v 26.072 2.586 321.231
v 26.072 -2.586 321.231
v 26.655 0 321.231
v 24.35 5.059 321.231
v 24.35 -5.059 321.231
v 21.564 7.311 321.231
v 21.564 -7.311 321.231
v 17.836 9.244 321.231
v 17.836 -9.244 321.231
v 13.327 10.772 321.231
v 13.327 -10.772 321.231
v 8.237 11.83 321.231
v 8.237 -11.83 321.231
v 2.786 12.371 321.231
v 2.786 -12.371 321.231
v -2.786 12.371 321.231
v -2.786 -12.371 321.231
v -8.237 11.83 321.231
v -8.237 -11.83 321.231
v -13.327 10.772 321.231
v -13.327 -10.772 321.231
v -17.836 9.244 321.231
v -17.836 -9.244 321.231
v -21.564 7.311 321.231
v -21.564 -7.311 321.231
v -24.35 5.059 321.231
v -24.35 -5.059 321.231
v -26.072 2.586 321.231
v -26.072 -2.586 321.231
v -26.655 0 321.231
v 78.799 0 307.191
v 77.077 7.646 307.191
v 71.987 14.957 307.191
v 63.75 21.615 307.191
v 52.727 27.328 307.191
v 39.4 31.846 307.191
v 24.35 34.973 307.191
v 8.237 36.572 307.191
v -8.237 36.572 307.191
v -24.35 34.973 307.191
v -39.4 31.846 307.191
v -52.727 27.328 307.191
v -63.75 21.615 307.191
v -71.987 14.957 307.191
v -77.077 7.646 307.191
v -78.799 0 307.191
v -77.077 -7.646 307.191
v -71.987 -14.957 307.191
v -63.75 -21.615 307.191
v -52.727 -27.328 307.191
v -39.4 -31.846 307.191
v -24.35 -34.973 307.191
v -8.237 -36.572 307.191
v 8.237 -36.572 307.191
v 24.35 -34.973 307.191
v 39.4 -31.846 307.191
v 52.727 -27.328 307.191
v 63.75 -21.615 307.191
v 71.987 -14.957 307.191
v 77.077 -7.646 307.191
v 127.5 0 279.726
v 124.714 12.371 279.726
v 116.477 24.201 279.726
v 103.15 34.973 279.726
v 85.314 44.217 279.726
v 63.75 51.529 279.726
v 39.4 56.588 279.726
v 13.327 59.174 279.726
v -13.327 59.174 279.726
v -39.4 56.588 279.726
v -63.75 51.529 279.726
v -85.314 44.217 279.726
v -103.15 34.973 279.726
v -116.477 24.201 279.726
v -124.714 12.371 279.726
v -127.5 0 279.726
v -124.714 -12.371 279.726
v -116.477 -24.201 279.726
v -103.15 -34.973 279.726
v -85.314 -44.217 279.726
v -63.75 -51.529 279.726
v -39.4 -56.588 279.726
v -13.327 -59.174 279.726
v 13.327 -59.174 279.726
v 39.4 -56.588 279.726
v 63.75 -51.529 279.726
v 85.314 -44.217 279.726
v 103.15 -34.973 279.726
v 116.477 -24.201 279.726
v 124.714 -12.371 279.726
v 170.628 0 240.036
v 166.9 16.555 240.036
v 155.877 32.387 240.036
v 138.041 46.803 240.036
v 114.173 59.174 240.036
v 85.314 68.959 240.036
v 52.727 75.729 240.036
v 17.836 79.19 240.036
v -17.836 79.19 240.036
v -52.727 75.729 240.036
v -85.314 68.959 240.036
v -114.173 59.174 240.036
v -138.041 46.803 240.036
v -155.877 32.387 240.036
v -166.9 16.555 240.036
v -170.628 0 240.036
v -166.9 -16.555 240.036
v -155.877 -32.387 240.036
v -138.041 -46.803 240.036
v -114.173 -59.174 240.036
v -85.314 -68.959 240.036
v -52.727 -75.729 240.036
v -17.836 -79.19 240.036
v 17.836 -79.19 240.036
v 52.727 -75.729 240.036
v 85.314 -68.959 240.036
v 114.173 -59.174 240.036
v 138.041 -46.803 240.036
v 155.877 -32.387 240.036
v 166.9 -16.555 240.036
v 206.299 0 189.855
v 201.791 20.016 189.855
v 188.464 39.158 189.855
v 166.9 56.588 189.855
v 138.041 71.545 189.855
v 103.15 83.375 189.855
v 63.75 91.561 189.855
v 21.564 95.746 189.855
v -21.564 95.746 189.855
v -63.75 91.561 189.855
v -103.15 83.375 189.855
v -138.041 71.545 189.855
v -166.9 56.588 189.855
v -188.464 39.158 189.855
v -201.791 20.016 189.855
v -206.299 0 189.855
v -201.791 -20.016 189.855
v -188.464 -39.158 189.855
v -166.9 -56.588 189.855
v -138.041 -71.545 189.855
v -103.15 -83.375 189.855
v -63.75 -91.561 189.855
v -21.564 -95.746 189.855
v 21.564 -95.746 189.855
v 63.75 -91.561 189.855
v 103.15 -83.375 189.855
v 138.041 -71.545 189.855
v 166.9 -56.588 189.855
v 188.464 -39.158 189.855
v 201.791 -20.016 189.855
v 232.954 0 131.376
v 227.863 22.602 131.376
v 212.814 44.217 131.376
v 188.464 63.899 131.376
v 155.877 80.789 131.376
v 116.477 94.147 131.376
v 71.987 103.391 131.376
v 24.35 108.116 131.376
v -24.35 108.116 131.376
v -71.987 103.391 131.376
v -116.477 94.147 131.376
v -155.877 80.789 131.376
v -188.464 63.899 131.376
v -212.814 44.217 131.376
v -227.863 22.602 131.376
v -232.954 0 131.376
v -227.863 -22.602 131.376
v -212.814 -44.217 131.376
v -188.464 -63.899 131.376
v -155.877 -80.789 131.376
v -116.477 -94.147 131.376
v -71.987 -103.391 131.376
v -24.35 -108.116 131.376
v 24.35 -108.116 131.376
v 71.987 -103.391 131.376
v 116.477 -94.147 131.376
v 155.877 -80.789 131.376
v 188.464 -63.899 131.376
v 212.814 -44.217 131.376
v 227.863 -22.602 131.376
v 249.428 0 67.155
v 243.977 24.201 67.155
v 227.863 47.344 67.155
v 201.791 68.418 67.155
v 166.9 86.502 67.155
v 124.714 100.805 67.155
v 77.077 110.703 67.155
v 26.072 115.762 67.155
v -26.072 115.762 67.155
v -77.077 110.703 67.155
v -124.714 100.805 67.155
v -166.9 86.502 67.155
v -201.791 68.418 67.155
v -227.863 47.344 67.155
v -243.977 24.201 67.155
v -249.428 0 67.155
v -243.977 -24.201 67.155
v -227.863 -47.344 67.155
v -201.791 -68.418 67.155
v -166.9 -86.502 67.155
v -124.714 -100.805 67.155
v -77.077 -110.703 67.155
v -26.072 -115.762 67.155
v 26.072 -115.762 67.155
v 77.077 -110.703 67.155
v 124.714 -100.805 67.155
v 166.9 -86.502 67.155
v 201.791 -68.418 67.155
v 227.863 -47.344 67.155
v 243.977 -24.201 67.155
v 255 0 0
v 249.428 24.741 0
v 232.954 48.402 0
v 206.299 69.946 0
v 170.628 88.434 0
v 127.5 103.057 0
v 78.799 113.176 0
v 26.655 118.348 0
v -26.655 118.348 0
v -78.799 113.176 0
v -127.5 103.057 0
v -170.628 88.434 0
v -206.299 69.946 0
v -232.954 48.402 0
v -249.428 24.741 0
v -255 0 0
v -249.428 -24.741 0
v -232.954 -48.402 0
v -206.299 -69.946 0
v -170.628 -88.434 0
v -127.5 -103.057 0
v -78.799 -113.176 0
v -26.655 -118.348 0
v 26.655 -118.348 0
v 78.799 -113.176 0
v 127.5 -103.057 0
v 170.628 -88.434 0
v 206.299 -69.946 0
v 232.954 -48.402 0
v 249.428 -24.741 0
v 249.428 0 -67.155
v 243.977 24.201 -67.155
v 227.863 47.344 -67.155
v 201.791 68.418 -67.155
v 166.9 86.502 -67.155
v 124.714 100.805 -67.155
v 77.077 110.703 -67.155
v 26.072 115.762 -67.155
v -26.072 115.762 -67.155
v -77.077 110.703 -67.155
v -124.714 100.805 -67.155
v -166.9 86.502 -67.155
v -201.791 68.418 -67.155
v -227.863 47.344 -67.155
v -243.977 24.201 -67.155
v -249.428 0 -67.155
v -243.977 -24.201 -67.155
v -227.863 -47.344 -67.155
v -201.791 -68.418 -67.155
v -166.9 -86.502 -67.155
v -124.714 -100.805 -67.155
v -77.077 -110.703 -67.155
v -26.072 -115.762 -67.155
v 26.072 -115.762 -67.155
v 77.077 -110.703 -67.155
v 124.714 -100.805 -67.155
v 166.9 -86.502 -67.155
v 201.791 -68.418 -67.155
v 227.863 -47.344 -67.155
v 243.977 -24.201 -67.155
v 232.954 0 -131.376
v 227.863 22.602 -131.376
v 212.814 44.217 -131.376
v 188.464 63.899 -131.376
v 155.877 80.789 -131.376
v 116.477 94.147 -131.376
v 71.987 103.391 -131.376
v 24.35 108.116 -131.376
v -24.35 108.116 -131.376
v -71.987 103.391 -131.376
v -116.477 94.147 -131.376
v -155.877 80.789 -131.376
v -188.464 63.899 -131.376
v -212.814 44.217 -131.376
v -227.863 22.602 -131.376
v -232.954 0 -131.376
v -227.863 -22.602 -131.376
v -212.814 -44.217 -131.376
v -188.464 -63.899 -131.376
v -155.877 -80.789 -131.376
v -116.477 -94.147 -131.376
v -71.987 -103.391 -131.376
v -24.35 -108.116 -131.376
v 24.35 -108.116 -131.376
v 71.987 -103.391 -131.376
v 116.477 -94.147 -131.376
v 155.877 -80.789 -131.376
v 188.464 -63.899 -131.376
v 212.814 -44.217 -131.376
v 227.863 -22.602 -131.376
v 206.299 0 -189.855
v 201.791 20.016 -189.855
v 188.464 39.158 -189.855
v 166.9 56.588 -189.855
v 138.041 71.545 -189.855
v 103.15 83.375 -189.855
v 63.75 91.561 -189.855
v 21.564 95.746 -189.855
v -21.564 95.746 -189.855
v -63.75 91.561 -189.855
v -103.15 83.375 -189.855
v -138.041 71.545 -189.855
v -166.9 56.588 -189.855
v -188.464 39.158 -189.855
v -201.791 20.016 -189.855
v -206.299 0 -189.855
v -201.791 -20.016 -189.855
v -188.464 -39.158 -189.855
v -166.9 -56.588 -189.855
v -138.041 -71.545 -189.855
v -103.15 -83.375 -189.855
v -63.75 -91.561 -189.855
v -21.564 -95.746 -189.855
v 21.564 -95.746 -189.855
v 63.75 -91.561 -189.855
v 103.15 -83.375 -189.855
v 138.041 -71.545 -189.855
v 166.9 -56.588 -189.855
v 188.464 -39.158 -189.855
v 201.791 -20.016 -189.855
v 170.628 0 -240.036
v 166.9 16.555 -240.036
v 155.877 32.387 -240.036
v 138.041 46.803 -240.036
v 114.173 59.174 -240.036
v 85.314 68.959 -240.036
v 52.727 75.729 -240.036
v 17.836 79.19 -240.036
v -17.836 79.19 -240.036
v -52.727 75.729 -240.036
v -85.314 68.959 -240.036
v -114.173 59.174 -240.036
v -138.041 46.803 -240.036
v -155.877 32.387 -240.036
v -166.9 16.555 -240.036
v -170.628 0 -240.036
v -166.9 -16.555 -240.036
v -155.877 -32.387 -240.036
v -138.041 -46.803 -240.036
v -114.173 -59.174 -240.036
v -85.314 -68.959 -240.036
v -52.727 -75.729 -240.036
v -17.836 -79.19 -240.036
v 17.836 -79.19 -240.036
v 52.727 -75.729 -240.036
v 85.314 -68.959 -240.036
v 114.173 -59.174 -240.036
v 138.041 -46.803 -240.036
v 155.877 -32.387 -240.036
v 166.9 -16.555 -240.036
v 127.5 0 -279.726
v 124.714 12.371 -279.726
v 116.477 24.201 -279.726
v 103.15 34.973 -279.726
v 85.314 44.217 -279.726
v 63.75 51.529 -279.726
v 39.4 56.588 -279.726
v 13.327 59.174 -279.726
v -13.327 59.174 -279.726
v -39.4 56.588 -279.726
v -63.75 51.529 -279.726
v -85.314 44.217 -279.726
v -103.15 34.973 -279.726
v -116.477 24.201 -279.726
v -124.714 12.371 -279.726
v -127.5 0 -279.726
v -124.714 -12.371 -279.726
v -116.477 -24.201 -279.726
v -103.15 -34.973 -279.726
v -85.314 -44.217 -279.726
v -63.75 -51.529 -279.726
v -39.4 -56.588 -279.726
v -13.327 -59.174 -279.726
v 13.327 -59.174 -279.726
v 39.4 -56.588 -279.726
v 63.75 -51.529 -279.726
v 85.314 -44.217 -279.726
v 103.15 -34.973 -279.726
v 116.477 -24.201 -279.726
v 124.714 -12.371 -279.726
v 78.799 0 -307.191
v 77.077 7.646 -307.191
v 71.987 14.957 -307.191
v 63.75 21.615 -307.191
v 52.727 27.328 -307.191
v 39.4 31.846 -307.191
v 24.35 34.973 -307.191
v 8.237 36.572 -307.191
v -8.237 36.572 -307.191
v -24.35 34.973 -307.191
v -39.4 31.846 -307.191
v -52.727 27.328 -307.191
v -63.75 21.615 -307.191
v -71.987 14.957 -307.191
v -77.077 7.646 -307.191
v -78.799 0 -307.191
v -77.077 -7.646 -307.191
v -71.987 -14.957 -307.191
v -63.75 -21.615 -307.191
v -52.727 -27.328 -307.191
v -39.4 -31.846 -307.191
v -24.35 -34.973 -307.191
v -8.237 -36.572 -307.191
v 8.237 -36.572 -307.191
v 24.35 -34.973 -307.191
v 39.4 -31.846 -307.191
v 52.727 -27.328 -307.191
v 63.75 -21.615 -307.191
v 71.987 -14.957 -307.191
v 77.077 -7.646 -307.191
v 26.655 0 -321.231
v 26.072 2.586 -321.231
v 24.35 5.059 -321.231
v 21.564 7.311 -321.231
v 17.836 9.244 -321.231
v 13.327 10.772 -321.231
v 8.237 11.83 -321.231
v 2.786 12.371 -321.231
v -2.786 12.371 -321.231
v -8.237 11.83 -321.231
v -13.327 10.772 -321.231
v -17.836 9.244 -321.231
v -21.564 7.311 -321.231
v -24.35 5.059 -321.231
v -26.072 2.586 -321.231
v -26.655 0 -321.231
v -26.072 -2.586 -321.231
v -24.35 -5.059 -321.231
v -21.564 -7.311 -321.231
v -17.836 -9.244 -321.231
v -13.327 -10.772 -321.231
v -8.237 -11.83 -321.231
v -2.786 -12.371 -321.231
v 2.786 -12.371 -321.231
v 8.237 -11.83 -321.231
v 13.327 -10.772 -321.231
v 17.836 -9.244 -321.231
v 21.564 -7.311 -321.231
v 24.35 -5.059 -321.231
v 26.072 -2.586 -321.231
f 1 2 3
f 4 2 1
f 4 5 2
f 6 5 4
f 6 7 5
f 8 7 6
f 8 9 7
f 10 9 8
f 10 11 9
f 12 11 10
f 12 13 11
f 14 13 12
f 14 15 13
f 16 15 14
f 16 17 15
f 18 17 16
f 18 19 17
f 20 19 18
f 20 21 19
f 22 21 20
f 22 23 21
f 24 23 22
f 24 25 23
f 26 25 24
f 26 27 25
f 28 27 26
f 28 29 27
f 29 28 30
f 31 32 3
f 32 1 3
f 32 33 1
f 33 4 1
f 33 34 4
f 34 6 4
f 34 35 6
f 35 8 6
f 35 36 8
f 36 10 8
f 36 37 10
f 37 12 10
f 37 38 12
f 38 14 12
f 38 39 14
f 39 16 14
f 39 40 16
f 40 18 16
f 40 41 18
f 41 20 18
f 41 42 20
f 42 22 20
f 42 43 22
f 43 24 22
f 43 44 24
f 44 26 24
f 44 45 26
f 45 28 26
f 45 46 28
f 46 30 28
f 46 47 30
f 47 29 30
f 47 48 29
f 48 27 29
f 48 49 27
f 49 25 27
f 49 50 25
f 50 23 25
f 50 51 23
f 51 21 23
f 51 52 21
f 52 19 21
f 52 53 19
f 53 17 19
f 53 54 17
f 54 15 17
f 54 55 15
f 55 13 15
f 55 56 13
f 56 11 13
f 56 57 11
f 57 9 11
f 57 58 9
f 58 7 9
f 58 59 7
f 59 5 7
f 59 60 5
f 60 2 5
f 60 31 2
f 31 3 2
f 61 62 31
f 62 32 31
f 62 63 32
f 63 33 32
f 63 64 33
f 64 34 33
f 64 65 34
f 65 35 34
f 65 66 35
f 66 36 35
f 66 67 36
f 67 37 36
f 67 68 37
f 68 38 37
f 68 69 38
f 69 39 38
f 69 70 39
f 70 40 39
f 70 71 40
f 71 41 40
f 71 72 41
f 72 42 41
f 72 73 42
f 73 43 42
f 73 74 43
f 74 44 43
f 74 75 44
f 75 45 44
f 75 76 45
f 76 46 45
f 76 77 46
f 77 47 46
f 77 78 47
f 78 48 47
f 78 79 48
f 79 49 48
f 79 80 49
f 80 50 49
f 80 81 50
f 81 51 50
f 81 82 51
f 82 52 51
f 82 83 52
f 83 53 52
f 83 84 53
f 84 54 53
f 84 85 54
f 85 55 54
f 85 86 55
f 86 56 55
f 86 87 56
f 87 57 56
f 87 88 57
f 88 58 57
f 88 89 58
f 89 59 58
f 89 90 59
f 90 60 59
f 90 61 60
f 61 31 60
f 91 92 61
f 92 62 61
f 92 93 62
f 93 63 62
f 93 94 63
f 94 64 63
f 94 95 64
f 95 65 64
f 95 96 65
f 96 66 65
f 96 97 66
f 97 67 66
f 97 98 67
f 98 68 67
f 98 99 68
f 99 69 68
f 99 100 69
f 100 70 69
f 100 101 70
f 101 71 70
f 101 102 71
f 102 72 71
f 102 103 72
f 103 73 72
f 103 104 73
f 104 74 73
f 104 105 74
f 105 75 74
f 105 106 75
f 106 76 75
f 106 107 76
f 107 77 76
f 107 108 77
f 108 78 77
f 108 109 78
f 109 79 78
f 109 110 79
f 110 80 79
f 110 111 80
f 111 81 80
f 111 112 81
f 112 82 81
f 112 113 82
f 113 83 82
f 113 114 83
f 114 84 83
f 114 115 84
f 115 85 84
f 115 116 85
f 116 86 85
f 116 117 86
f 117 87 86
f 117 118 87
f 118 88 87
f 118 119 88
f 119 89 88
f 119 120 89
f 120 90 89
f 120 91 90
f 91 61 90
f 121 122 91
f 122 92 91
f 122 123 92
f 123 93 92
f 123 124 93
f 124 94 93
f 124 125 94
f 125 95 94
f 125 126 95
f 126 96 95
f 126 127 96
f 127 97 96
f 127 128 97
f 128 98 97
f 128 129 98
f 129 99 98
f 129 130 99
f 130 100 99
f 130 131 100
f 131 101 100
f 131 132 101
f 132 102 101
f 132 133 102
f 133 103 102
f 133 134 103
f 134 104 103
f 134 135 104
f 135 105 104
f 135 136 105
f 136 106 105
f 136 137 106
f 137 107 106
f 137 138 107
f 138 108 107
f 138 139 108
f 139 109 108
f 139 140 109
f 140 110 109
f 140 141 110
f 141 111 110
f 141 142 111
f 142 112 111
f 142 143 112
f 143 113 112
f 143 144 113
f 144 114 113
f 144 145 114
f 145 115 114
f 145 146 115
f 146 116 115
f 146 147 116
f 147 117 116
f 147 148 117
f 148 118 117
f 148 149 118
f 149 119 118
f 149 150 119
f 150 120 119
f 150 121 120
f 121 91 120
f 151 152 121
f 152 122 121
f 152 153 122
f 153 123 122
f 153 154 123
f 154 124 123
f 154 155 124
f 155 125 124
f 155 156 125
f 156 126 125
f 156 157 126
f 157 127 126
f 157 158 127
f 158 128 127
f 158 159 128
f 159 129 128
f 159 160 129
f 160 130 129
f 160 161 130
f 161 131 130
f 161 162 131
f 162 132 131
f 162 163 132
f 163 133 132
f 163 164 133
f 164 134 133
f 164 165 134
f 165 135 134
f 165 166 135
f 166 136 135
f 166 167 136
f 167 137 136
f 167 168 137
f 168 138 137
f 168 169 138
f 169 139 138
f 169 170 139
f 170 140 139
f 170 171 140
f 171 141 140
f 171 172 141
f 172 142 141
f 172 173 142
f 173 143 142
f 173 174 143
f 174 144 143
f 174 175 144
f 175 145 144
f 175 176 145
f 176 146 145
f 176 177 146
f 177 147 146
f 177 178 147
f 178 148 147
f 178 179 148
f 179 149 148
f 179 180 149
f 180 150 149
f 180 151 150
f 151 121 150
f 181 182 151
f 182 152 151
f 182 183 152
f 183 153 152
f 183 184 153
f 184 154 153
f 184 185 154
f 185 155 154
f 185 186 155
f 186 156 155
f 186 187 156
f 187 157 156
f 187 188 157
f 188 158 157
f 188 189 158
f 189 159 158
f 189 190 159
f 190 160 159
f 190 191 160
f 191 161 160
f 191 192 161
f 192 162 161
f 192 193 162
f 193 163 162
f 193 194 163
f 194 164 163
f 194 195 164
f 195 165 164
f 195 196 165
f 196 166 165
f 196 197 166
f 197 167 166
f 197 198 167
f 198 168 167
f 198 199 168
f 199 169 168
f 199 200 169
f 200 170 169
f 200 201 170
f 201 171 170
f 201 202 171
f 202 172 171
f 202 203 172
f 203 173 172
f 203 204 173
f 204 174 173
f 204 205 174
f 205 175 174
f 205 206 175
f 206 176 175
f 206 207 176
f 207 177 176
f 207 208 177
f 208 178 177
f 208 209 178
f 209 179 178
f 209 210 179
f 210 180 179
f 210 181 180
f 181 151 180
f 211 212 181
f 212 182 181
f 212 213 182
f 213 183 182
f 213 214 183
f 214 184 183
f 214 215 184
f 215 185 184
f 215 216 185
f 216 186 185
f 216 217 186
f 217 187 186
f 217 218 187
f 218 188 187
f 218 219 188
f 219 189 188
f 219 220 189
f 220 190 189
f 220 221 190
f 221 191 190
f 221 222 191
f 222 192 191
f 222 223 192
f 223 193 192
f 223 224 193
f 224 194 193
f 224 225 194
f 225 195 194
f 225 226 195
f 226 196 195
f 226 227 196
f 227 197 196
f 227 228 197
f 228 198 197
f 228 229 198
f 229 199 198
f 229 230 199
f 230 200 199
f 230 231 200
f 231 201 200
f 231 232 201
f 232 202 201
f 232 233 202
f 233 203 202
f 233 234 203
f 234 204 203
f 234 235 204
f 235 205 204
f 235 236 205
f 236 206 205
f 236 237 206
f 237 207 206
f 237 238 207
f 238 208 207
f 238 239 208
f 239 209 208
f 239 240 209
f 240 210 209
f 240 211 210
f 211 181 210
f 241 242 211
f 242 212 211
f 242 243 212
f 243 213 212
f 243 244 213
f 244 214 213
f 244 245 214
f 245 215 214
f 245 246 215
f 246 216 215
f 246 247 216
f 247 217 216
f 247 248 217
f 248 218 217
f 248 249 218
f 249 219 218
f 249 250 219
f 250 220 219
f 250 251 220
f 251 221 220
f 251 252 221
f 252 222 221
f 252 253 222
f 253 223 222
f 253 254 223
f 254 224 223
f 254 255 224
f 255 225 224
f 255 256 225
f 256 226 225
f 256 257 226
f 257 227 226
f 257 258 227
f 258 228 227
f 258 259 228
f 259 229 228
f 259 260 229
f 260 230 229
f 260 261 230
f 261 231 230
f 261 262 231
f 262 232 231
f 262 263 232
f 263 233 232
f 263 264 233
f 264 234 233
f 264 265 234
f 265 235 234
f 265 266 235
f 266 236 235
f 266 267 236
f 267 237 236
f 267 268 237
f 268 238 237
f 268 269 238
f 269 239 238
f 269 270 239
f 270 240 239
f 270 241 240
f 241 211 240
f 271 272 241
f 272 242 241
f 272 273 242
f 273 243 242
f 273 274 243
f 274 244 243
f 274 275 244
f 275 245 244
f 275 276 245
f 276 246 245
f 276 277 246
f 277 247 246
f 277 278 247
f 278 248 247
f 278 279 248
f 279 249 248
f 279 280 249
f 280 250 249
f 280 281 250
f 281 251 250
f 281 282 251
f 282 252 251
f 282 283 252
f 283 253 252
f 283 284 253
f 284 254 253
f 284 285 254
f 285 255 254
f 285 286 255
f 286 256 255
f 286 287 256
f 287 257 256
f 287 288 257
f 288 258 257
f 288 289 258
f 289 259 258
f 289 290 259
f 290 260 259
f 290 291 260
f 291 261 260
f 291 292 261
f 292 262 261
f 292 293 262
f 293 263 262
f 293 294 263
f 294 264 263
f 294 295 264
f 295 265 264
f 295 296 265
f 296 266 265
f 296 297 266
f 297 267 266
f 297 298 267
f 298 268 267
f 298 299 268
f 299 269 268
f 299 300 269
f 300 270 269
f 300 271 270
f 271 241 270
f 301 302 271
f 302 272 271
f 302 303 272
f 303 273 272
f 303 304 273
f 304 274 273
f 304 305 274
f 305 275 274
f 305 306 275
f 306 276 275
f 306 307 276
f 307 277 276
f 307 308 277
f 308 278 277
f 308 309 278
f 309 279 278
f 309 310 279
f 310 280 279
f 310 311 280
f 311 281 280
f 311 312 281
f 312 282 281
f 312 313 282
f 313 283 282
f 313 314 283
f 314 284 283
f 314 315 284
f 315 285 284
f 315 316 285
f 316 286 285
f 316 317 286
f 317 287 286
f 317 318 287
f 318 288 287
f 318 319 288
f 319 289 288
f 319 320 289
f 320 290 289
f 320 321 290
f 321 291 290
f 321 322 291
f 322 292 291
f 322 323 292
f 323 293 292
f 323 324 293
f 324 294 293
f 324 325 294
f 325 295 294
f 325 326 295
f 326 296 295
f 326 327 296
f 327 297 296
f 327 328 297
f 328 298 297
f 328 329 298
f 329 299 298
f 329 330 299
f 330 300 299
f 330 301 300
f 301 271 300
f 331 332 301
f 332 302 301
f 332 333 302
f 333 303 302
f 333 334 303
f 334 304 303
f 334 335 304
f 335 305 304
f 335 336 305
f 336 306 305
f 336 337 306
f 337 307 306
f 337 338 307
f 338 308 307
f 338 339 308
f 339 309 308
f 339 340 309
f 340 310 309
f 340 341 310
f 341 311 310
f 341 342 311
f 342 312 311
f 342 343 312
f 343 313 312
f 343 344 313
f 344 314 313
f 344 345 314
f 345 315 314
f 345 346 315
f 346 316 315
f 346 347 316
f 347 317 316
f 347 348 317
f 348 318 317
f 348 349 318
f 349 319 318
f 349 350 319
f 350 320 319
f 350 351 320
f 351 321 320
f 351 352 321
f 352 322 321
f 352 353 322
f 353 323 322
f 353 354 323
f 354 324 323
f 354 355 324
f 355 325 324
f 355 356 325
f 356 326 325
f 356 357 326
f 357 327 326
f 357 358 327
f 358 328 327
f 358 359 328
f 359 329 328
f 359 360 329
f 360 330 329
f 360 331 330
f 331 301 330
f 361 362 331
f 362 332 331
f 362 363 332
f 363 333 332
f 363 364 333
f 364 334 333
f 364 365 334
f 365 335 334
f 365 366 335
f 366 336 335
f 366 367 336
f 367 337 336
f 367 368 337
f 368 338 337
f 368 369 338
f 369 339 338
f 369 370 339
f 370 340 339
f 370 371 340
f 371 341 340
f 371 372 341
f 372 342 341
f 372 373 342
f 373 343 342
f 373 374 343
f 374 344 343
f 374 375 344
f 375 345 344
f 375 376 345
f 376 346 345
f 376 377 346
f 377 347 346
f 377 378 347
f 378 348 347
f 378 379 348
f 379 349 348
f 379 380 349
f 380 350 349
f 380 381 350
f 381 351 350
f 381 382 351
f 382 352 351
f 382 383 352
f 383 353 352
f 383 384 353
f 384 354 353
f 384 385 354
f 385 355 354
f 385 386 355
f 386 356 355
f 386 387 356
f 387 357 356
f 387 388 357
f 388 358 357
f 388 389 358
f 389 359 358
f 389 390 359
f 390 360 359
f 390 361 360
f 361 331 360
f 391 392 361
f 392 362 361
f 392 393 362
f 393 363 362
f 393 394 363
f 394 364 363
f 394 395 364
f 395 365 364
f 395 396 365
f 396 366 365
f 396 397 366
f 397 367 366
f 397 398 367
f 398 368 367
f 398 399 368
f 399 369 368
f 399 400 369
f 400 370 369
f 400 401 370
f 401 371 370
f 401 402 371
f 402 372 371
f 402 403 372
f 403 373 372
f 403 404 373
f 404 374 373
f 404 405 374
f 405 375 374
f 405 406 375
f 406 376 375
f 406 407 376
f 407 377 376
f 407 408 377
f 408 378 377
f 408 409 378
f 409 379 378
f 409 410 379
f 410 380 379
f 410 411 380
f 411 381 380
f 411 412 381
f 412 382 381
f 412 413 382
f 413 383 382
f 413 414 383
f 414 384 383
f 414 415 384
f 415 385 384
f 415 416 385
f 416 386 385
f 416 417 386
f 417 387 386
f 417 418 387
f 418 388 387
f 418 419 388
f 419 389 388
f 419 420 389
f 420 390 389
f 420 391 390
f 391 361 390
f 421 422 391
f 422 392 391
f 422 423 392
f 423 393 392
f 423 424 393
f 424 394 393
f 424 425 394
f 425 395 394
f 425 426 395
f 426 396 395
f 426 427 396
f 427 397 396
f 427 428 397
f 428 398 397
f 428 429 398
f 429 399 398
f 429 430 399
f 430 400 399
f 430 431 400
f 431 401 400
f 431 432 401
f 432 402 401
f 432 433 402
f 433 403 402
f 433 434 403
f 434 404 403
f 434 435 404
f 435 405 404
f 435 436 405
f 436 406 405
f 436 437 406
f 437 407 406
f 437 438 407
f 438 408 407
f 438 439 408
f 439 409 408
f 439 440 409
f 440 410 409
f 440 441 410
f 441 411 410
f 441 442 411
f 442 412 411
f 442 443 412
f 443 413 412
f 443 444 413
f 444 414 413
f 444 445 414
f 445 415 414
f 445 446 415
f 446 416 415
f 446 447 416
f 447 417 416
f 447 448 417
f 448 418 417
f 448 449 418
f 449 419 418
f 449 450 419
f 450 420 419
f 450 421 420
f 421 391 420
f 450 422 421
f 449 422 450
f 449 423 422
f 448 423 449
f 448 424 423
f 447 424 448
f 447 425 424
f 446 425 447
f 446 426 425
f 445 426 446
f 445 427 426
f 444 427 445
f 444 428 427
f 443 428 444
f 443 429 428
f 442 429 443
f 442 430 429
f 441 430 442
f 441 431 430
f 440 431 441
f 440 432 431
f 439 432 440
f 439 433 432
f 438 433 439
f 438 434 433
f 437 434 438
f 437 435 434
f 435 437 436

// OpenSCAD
// Generated by SolidPython 1.0.1 on 2020-07-29 00:46:51


scale(v = [15, 7, 19]) {
	sphere(r = 17);
}
/***********************************************
*********      SolidPython code:      **********
************************************************
 
# import packages: SolidPython
from solid import *
from solid.utils import *
from itertools import chain, combinations, permutations


class Resize:

    def __init__(self, scad_file):
        self.scad_file = scad_file
        #self.scad_file = import_scad(scad_file)
        # cone/cylinder param:
        self.r1 = 0
        self.r2 = 0
        self.h = 0
        # rectangular prism param:
        self.w = 0
        self.l = 0
        # ellipse param:
        self.r = 0

    # import OpenScad code (file name corresponds to shape)


    # classify shape + parameters
    def assign(self, param1, param2, param3):
        if self.scad_file == 'cone.scad':
            self.r1 = param1
            self.r2 = param2
            self.h = param3
        elif self.scad_file == 'cylinder.scad':
            self.r1 = param1
            self.r2 = param2
            self.h = param3
        elif self.scad_file == 'rectangularPrism.scad':
            self.h = param1
            self.l = param2
            self.w = param3
        else:
            self.r = param1
            self.h = param2

    # resize parameters
    def iterate(self):
        x = range(3, 20, 2)
        i = 1
        if self.scad_file == 'cone.scad':
            tempList = list(permutations(x, 2))
            for temp in tempList:
                param1 = temp[0]
                param2 = temp[1]
                filepath = 'produced_scad_files/' + 'cone' + str(param1) + '_' + str(param2) + '_' + '.scad'
                scad_render_to_file(cylinder(h=param1, r1=param2, r2=0), filepath)

        elif self.scad_file == 'cylinder.scad':
            tempList = list(permutations(x, 3))
            for temp in tempList:
                param1 = temp[0]
                param2 = temp[1]
                filepath = 'produced_scad_files/' + 'cylinder' + str(param1) + '_' + str(param2) + '_' + '.scad'
                scad_render_to_file(cylinder(h=param1, r1=param2, r2=param2), filepath)

        elif self.scad_file == 'rectangularPrism.scad':
            tempList = list(permutations(x, 3))
            for temp in tempList:
                param1 = temp[0]
                param2 = temp[1]
                param3 = temp[2]
                filepath = 'produced_scad_files/' + 'rectangularPrism' + str(param1) + '_' + str(param2) + '_' + str(
                    param3) + '.scad'
                scad_render_to_file(cube(size=(param1, param2, param3)), filepath)

        elif self.scad_file == 'ellipse.scad':
            tempList = list(permutations(x, 4))
            for temp in tempList:
                param1 = temp[0]
                param2 = temp[1]
                param3 = temp[2]
                param4 = temp[3]
                filepath = 'produced_scad_files/' + 'ellipse' + str(param1) + '_' + str(param2) + '_' + str(param3) + '_' + str(param4) + '.scad'
                scad_render_to_file(scale([param1, param2, param3])(sphere(r=param4)), filepath)

    def render_to_scadfile(self):
        scad_render_to_file(scad, 'example.scad') 
 
************************************************/
